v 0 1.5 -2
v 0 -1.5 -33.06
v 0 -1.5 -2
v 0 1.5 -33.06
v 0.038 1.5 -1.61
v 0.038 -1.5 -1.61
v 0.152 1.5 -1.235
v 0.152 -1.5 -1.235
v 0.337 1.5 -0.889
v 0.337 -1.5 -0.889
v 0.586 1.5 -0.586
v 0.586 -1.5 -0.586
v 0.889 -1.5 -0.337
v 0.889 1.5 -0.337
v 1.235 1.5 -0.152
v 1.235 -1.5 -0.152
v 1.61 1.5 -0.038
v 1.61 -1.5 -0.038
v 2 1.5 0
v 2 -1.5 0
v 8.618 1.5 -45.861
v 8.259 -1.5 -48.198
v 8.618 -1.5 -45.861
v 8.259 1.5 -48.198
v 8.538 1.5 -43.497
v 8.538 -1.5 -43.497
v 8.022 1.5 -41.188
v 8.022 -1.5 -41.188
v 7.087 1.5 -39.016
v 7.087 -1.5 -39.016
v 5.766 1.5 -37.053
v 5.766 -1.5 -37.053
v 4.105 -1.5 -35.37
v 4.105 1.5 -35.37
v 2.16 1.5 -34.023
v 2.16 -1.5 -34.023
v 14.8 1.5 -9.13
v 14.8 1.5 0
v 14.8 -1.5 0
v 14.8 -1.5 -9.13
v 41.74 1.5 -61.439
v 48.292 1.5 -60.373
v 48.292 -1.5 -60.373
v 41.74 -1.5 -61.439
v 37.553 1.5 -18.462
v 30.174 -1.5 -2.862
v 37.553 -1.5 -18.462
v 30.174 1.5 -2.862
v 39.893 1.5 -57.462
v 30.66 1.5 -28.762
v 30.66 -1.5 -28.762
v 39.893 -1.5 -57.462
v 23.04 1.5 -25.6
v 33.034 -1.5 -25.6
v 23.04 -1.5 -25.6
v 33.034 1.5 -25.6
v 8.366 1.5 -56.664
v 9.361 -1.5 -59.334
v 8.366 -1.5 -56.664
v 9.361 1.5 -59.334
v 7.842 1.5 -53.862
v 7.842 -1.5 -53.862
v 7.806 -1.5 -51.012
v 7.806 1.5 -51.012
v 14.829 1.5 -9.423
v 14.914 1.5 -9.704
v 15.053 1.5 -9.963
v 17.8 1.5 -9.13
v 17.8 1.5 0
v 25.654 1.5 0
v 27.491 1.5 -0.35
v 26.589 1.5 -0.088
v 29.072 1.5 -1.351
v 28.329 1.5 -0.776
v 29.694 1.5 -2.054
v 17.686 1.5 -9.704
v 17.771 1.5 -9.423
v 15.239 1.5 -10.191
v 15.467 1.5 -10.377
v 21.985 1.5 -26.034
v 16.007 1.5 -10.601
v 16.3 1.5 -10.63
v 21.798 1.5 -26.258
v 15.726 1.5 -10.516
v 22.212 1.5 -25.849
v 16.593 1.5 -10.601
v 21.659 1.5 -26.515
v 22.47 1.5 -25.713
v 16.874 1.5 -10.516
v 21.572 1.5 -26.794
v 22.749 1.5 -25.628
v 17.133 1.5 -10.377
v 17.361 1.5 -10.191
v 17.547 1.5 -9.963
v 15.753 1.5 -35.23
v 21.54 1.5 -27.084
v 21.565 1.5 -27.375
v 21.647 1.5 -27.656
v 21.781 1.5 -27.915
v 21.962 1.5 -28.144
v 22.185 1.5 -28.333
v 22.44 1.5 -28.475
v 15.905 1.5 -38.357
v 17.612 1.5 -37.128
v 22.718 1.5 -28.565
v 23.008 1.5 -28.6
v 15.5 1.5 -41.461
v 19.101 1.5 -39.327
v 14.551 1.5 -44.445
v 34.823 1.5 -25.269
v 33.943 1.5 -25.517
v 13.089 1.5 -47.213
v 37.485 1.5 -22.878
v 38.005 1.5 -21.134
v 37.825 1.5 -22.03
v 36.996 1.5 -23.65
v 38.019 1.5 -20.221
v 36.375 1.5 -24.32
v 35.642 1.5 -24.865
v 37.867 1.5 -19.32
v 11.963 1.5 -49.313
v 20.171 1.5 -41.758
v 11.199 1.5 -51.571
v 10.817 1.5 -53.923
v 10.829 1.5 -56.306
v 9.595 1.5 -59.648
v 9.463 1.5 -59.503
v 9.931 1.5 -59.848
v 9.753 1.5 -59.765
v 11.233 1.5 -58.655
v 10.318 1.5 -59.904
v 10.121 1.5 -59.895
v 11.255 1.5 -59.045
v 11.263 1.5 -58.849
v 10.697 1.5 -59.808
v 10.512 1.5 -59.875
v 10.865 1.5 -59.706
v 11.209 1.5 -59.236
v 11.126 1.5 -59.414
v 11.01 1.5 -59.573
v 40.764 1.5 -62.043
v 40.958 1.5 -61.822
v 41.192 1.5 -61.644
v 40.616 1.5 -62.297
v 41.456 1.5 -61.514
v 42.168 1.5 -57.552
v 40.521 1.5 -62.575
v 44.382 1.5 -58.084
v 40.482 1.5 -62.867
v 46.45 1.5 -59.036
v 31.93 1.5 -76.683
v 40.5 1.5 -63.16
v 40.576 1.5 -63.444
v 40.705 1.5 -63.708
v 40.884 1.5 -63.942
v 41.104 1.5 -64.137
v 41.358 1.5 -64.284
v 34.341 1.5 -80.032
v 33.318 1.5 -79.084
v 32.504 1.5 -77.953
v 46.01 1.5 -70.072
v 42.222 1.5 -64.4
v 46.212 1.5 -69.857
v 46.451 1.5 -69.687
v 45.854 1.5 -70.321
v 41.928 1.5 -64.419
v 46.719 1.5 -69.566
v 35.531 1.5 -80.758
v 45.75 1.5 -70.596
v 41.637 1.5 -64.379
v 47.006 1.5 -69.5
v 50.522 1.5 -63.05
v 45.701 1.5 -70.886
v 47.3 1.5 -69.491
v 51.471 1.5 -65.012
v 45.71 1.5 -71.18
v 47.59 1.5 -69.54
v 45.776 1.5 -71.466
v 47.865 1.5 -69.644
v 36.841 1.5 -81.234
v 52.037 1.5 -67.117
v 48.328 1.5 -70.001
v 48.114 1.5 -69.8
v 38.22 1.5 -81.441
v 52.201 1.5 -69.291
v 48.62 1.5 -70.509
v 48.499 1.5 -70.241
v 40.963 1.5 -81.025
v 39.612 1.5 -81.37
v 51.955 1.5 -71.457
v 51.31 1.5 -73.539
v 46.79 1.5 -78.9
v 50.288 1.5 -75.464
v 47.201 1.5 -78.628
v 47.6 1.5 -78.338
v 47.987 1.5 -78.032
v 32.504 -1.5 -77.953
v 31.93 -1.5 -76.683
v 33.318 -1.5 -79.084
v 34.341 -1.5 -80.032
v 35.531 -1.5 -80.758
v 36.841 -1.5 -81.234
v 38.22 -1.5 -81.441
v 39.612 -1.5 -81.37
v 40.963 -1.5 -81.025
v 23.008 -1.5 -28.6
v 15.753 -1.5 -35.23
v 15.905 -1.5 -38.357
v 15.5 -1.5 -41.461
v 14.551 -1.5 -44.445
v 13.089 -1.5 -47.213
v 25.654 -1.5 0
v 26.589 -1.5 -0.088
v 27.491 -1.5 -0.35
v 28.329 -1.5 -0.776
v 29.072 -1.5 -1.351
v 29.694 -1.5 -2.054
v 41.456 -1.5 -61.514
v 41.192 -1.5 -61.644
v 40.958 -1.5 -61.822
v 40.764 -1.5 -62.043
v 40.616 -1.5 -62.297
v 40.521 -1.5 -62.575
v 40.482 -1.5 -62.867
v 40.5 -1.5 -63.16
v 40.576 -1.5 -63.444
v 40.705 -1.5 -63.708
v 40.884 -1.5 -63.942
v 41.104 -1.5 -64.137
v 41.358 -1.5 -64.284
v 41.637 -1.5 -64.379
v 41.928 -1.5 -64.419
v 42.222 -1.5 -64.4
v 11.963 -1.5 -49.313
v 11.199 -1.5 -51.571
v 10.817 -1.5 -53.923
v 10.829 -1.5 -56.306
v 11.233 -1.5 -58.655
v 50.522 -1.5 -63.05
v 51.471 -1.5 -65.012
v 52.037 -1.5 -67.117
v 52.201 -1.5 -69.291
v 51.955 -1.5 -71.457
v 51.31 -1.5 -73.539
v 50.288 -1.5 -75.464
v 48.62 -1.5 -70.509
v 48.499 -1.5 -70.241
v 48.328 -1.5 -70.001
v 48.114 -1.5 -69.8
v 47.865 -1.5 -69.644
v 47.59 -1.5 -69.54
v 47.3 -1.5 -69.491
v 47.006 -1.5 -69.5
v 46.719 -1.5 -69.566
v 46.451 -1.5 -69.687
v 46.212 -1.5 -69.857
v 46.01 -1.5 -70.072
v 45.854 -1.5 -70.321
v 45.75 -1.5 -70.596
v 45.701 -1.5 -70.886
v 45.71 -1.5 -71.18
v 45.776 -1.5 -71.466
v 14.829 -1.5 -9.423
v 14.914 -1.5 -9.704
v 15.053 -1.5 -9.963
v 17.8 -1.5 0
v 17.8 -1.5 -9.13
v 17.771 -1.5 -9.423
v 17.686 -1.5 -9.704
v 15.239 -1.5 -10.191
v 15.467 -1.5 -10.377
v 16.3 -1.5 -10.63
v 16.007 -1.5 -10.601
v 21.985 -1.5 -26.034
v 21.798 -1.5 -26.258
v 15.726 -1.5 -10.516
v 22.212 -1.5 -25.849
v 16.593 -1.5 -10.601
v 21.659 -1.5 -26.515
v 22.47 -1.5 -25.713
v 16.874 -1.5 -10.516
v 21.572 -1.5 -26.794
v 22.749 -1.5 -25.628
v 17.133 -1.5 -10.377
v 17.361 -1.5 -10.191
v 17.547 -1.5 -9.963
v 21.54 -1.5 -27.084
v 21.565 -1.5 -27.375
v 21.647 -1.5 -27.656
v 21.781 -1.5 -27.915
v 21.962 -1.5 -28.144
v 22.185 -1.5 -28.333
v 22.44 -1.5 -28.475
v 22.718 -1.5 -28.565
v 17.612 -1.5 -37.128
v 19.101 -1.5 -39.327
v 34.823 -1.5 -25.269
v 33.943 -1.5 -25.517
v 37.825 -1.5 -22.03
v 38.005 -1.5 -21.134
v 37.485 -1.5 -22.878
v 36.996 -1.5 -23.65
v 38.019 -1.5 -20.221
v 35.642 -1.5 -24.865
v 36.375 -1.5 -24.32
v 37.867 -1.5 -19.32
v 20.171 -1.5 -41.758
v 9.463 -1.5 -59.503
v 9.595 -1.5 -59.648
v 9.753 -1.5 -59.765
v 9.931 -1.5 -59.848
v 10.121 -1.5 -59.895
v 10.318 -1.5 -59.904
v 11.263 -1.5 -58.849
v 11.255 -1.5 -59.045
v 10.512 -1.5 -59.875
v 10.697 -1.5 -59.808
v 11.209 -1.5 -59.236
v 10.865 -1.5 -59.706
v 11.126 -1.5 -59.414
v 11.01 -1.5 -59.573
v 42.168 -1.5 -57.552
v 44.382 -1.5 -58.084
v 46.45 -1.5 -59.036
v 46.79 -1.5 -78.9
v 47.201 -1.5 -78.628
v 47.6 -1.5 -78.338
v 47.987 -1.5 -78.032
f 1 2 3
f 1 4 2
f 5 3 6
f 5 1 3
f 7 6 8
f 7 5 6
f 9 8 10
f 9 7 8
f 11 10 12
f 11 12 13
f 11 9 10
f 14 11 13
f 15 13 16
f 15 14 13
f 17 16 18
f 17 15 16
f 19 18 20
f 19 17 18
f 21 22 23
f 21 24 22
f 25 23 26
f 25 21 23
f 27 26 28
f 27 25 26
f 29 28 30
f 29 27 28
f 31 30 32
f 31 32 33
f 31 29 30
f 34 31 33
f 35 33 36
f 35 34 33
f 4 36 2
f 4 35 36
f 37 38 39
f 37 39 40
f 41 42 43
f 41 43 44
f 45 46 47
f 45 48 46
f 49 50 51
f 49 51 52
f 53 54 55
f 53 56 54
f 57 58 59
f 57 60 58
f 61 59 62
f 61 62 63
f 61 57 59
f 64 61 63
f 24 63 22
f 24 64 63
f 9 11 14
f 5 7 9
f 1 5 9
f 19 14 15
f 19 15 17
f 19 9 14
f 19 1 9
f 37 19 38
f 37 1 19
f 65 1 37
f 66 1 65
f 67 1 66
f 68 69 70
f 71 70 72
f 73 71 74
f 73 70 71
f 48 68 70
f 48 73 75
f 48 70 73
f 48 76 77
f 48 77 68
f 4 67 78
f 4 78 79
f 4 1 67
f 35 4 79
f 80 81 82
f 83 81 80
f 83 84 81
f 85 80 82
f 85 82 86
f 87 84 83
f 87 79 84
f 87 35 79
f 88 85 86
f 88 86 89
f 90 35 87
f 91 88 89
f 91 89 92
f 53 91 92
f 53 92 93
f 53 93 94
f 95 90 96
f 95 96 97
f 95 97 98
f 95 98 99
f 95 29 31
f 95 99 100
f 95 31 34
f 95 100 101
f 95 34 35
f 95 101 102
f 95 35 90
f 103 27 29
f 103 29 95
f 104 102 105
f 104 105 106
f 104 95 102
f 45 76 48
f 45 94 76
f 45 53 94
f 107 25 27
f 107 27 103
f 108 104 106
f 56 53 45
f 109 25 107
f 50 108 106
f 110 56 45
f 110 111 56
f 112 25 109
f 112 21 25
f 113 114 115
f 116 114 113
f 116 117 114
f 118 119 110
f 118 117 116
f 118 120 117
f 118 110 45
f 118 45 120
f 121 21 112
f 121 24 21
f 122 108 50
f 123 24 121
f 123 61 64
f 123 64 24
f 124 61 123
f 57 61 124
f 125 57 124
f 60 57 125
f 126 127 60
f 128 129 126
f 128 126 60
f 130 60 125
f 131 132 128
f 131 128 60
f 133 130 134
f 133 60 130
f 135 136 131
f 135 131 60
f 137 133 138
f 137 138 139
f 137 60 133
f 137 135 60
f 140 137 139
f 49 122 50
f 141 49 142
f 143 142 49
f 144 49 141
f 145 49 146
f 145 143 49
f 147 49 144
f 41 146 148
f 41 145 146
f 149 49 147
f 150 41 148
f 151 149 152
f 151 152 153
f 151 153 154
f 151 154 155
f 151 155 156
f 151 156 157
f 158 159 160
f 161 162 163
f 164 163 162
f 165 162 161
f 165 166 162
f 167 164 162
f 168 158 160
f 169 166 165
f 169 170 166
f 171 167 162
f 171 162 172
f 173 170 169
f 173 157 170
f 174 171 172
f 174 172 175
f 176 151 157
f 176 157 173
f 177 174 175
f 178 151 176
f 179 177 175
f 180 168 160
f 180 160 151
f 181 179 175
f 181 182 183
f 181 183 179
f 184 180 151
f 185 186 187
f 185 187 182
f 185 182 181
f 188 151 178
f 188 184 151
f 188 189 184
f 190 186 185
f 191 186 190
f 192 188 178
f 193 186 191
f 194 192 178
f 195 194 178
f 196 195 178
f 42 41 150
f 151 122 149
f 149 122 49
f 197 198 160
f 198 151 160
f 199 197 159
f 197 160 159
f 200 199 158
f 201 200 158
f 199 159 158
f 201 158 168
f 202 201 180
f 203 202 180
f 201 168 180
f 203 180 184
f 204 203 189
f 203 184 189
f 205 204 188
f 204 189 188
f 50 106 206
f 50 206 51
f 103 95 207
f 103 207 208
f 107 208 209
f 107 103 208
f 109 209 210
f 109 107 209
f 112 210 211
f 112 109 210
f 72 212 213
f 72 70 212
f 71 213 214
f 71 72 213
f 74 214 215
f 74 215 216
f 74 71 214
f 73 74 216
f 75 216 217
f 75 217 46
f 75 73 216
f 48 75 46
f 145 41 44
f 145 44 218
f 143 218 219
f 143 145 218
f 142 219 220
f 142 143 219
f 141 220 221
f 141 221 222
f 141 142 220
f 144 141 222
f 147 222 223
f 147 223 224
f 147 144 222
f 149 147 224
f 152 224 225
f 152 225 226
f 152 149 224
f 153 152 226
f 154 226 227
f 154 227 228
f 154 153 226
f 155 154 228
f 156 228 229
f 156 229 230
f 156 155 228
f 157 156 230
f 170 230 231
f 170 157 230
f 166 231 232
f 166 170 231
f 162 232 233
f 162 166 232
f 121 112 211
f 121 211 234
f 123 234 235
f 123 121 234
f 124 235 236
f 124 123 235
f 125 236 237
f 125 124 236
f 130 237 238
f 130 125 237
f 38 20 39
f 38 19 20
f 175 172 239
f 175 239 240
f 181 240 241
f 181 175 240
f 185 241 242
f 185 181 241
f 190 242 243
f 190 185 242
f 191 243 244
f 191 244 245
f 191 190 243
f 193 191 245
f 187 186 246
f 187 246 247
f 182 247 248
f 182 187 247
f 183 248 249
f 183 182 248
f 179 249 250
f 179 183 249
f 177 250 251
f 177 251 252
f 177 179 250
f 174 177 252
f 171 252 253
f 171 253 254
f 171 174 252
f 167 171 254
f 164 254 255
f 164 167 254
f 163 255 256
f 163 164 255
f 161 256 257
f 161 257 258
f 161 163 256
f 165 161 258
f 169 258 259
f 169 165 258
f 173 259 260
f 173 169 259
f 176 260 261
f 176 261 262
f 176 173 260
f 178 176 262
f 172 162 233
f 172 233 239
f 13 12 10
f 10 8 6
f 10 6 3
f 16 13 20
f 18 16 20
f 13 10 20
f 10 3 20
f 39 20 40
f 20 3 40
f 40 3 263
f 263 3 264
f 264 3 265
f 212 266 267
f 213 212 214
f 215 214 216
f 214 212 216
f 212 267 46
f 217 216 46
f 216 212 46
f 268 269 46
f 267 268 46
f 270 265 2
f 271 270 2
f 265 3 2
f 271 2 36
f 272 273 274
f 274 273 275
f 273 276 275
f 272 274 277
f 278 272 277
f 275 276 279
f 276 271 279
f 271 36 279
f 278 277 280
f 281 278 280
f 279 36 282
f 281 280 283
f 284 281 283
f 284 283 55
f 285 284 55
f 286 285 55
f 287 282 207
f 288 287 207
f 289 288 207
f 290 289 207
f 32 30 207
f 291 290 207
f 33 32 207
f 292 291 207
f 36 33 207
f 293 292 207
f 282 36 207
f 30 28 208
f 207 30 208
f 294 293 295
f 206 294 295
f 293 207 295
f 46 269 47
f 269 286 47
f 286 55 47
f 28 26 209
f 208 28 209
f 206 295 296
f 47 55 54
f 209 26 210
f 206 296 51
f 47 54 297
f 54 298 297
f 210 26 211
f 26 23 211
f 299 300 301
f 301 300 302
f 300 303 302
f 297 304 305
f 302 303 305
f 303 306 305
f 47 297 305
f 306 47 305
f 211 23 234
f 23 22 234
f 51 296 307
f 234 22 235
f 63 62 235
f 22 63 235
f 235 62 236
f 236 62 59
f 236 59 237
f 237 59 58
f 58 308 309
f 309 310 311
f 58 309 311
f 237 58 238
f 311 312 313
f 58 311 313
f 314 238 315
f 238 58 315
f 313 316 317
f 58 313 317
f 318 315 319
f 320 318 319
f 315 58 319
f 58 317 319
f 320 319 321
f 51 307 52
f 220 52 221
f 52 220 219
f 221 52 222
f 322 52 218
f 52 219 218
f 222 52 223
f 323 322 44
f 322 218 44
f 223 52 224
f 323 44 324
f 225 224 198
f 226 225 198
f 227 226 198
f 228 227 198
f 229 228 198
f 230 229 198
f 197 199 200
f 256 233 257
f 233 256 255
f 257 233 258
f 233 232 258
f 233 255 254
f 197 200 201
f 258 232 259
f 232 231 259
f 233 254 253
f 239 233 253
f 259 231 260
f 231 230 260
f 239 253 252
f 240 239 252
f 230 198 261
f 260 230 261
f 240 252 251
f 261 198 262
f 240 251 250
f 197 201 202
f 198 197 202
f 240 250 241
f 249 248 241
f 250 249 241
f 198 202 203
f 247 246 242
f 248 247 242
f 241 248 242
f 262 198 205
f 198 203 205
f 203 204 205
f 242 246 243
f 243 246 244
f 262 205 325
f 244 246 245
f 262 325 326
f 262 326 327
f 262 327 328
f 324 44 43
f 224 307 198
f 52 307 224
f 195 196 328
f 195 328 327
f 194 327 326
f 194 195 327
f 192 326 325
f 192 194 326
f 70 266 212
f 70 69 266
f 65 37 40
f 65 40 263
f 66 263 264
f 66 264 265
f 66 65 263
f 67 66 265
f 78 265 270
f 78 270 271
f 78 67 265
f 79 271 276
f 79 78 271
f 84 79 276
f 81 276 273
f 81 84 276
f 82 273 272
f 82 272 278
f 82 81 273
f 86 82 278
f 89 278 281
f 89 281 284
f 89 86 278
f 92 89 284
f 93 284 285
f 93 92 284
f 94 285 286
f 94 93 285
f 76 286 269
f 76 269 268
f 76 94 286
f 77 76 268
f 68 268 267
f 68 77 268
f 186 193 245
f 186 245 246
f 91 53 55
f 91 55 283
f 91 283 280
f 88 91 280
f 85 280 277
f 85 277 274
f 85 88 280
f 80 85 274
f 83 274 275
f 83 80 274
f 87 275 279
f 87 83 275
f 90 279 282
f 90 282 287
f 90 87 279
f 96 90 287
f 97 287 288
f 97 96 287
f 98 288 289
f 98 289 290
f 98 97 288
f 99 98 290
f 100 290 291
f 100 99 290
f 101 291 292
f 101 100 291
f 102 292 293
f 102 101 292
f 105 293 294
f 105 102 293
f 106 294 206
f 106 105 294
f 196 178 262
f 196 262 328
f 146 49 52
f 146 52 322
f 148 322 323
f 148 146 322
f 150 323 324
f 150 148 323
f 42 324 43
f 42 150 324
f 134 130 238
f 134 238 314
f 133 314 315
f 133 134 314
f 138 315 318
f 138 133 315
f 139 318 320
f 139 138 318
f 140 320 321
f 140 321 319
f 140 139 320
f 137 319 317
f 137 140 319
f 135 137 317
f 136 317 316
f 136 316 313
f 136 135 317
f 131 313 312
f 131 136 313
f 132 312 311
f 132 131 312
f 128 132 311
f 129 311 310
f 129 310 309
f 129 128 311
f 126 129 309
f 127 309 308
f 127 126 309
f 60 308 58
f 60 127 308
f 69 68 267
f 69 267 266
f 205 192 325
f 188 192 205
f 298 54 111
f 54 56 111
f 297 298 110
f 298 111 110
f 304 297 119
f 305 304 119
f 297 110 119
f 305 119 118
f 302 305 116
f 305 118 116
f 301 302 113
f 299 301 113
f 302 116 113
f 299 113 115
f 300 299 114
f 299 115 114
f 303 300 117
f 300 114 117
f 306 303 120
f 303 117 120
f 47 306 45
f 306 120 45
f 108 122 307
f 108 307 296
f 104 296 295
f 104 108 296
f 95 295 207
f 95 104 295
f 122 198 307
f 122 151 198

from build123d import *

# Parameters (mm, degrees)
BOSS_EXTRUDE1_DEPTH = 1.5
FILLET1_R           = 5
FILLET3_R           = 7
FILLET4_R           = 2
FILLET5_R           = 5


with BuildPart() as part:
    # Sketch1 → Boss-Extrude1 (new, symmetric)
    with BuildSketch(Plane(origin=(0, 0, 0), x_dir=(1, 0, 0), z_dir=(0, 1, 0))):
        with BuildLine():
            Line((0, 33.06), (0, 0))
            Line((0, 0), (14.8, 0))
            Line((14.8, 0), (14.8, 9.13))
            ThreePointArc((14.8, 9.13), (16.3, 10.63), (17.8, 9.13))
            Line((17.8, 9.13), (17.8, 0))
            Line((17.8, 0), (28.82, 0))
            Line((28.82, 0), (40.93, 25.6))
            Line((40.93, 25.6), (23.039915269, 25.6))
            ThreePointArc((23.039915269, 25.6), (21.54, 27.084056775), (23.00803062, 28.599661085))
            Line((23.00803062, 28.599661085), (30.66, 28.762351413))
            Line((30.66, 28.762351413), (39.893121089, 57.462102219))
            ThreePointArc((39.893121089, 57.462102219), (44.38174059, 58.083541414), (48.292108688, 60.373282238))
            Line((48.292108688, 60.373282238), (41.74, 61.438906704))
            ThreePointArc((41.74, 61.438906704), (40.500247088, 63.160247088), (42.221587473, 64.4))
            Line((42.221587473, 64.4), (50.522210261, 63.05))
            ThreePointArc((50.522210261, 63.05), (52.200549071, 69.291091406), (50.287964746, 75.464426347))
            Line((50.287964746, 75.464426347), (48.619556224, 70.509026223))
            ThreePointArc((48.619556224, 70.509026223), (46.719339491, 69.566064737), (45.776378004, 71.466281471))
            Line((45.776378004, 71.466281471), (47.986855886, 78.031701286))
            ThreePointArc((47.986855886, 78.031701286), (47.402242068, 78.484891921), (46.79, 78.9))
            Line((46.79, 78.9), (34.22, 83.484702826))
            Line((34.22, 83.484702826), (20.171354305, 41.75831525))
            ThreePointArc((20.171354305, 41.75831525), (18.405987937, 38.194020326), (15.753217128, 35.230319303))
            ThreePointArc((15.753217128, 35.230319303), (15.499590166, 41.461362705), (13.089045589, 47.212841067))
            ThreePointArc((13.089045589, 47.212841067), (10.959051171, 52.738918493), (11.232947268, 58.654946626))
            ThreePointArc((11.232947268, 58.654946626), (10.606012481, 59.845600176), (9.361365657, 59.334173363))
            ThreePointArc((9.361365657, 59.334173363), (7.842242616, 53.86210101), (8.259081404, 48.198395856))
            ThreePointArc((8.259081404, 48.198395856), (7.08728895, 39.015533985), (0, 33.06))
        make_face()
    extrude(amount=BOSS_EXTRUDE1_DEPTH, both=True)

    # Fillet1
    fillet1_edges = [part.edges().sort_by_distance(p)[0] for p in [
        (40.93, 0, -25.6),
    ]]
    fillet(fillet1_edges, radius=FILLET1_R)

    # Fillet3
    fillet3_edges = [part.edges().sort_by_distance(p)[0] for p in [
        (34.22, 0, -83.484702826),
    ]]
    fillet(fillet3_edges, radius=FILLET3_R)

    # Fillet4
    fillet4_edges = [part.edges().sort_by_distance(p)[0] for p in [
        (0, 0, 0),
    ]]
    fillet(fillet4_edges, radius=FILLET4_R)

    # Fillet5
    fillet5_edges = [part.edges().sort_by_distance(p)[0] for p in [
        (28.82, 0, 0),
    ]]
    fillet(fillet5_edges, radius=FILLET5_R)


solid = part.part
